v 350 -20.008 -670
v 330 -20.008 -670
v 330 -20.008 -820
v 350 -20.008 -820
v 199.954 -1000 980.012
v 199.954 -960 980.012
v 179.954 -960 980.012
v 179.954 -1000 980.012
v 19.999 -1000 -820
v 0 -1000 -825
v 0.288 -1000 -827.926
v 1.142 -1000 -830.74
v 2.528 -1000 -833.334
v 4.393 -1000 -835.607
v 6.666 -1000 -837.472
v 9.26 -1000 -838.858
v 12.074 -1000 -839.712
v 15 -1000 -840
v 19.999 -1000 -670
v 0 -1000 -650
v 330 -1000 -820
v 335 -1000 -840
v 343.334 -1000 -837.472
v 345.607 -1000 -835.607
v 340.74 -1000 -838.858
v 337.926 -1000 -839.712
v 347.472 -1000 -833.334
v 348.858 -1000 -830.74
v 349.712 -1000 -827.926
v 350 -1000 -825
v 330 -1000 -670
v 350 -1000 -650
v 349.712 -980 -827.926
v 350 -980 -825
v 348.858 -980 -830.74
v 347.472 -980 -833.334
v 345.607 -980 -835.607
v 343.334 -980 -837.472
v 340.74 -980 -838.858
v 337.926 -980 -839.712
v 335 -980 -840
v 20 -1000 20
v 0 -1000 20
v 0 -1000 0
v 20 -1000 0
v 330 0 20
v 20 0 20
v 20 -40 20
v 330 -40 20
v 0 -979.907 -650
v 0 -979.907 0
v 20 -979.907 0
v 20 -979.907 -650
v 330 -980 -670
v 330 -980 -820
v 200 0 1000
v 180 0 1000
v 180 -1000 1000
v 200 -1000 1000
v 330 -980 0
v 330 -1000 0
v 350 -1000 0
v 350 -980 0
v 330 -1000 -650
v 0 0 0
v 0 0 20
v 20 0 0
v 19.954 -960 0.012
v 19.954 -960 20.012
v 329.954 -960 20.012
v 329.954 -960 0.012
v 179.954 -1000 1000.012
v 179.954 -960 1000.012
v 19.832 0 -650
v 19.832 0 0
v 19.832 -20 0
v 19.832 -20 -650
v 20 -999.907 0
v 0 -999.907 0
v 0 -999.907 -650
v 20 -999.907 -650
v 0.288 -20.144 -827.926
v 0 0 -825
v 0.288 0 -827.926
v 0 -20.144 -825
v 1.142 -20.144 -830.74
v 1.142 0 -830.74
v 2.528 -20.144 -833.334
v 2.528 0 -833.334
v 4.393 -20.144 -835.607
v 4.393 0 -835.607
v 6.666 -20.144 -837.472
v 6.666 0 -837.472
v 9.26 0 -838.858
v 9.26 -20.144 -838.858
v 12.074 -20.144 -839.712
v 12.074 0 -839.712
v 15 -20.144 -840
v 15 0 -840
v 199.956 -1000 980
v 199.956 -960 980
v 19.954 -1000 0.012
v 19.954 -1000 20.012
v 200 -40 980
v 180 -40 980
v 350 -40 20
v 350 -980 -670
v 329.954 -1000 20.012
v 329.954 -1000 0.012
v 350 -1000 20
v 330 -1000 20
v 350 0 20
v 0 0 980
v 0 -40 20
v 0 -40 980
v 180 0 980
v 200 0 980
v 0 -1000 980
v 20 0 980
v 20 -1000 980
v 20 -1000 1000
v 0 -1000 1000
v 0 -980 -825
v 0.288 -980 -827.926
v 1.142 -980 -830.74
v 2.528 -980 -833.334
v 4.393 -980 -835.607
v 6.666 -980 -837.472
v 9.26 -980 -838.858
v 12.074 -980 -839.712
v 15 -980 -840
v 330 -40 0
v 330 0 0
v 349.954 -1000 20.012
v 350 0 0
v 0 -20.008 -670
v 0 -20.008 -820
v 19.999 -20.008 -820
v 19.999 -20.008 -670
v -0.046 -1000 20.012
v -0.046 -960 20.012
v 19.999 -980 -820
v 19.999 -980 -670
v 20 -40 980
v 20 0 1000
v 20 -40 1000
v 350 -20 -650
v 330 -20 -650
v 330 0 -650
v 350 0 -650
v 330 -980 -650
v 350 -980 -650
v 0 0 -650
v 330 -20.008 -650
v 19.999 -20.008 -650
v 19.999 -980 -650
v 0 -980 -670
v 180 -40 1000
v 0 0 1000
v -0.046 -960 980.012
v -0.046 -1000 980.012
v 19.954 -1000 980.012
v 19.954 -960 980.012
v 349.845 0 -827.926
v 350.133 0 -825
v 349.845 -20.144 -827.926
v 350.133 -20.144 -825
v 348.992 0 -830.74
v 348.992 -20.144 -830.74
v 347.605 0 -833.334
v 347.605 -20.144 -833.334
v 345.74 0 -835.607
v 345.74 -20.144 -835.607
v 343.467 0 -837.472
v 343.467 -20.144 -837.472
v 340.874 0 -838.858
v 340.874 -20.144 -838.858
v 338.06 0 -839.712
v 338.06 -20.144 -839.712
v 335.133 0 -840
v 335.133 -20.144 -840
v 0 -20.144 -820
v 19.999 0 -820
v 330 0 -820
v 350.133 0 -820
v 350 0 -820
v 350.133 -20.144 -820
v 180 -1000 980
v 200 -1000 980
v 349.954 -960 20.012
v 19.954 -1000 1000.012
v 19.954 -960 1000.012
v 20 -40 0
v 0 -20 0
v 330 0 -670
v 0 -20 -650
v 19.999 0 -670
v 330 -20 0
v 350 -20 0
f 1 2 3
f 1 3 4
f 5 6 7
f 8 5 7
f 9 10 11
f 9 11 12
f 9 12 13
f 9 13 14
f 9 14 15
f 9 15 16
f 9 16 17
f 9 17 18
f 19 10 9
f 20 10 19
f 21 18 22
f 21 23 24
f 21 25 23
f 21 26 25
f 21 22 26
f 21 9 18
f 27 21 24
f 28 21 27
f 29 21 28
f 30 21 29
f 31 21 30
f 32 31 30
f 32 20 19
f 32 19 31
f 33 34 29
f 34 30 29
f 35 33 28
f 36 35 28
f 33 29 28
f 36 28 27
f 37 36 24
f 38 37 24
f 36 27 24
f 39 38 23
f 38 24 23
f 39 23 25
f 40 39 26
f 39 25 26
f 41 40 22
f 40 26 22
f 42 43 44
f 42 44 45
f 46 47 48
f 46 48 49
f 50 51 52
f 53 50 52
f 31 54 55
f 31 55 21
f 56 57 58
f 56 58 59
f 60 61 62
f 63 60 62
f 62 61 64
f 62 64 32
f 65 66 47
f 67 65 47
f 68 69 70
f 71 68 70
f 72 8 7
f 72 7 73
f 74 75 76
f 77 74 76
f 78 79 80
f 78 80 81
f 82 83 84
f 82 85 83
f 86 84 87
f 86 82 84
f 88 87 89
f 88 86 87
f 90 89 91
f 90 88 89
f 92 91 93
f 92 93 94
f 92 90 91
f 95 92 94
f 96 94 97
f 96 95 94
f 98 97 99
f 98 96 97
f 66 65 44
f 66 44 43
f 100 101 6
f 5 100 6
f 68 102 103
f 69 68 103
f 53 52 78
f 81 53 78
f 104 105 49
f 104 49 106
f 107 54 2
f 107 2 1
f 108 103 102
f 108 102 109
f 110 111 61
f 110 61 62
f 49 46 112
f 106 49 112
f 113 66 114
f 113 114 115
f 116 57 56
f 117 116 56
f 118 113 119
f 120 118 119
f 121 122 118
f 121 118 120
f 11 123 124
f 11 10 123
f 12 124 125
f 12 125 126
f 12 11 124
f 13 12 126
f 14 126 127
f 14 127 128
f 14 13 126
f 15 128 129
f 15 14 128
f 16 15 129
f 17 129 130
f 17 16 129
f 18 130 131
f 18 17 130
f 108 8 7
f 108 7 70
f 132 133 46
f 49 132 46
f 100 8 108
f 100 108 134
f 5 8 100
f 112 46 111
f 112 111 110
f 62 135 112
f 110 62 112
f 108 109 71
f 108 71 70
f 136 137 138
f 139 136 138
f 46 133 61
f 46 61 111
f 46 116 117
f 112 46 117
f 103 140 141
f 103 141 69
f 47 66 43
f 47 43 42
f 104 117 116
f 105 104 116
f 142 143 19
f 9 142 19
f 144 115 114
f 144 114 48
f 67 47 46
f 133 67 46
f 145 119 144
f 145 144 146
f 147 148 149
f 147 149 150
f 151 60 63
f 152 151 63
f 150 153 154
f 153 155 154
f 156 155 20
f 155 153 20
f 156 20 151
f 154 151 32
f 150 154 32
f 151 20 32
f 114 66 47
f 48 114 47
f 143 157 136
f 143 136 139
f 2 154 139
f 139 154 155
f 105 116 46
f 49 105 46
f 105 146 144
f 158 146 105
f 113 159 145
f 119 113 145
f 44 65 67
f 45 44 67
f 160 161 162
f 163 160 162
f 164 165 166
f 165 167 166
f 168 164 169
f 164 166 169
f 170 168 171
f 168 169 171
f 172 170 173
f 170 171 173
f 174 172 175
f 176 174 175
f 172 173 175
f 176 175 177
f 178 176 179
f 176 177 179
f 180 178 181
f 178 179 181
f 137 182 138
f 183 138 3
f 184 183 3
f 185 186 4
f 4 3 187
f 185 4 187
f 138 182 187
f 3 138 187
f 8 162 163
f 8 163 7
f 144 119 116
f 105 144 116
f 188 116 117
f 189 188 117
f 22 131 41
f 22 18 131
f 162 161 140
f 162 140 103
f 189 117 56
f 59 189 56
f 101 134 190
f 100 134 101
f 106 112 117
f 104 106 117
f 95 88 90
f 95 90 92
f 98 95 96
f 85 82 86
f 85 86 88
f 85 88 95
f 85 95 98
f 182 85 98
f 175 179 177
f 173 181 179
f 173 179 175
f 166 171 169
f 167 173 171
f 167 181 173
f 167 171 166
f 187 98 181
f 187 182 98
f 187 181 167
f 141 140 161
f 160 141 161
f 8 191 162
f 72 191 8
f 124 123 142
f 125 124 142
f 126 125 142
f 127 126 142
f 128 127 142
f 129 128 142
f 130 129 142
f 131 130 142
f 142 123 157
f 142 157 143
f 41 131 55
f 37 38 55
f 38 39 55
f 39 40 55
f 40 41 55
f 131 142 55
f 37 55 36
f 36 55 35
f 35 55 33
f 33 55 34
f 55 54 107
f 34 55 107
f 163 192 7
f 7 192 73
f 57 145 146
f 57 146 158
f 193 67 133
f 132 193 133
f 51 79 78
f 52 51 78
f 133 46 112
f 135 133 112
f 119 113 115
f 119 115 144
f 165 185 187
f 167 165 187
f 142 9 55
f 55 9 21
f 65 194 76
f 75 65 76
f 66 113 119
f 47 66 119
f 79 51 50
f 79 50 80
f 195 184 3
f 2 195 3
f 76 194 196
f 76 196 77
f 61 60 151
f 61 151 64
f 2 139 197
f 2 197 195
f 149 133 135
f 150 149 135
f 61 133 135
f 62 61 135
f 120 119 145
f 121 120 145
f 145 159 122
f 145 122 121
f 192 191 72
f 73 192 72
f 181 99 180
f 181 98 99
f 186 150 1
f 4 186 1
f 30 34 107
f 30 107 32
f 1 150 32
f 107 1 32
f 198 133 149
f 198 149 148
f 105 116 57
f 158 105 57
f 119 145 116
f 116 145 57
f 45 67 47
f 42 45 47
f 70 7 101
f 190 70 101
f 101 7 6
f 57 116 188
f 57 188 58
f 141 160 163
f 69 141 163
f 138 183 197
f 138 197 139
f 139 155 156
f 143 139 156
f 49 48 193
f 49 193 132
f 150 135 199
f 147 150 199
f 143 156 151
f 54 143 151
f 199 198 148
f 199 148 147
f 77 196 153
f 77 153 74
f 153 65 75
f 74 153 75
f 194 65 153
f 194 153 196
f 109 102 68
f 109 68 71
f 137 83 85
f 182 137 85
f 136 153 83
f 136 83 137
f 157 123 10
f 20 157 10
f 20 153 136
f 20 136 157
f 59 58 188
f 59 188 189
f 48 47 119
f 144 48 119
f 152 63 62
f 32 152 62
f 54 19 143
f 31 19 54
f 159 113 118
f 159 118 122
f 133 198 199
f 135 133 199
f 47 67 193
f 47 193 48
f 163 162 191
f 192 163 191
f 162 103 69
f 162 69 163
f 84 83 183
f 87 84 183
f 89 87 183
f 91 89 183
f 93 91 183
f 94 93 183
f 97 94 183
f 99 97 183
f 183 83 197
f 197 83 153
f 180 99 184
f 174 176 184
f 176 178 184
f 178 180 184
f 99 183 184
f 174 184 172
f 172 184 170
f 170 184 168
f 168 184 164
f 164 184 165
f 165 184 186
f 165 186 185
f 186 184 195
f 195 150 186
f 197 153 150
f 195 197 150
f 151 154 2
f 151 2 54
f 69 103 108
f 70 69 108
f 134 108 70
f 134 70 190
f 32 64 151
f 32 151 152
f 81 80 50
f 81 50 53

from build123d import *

# Parameters (mm, degrees)
F0_W      = 20
F0_H      = 20
F1_DEPTH  = 1000
F0_W_2    = 160
F3_DEPTH  = 40
F0_H_2    = 960
F0_W_3    = 310
F2_W      = 20
F2_H      = 960
F4_DEPTH  = 40
F2_W_2    = 160
F2_H_2    = 20
F2_W_3    = 310
F5_W      = 20
F5_H      = 20
F6_DEPTH  = 650
F5_W_2    = 19.8324881494
F7_W      = 20
F7_H      = 20
F7_H_2    = 959.9921046942
F7_W_2    = 19.9989583343
F8_DEPTH  = 20
F9_W      = 19.9989583343
F9_H      = 20
F9_W_2    = 20
F9_H_2    = 20.0078953058
F10_DEPTH = 150
F11_W     = 350.1334488392
F11_H     = 20.1436914504
F11_W_2   = 330
F11_H_2   = 20
F11_W_3   = 20
F12_DEPTH = 20
F13_R     = 15


with BuildPart() as f1:
    # F0 (on Front) → F1 (new body)
    with BuildSketch(Plane.XZ):
        with Locations((190, 990)):
            Rectangle(F0_W, F0_H)
    extrude(amount=F1_DEPTH)


with BuildPart() as f1b:
    # F0 (on Front) → F1, piece 2 (new body)
    with BuildSketch(Plane.XZ):
        with Locations((10, 990)):
            Rectangle(F0_W, F0_H)
    extrude(amount=F1_DEPTH)


with BuildPart() as f1c:
    # F0 (on Front) → F1, piece 3 (new body)
    with BuildSketch(Plane.XZ):
        with Locations((10, 10)):
            Rectangle(F0_W, F0_H)
    extrude(amount=F1_DEPTH)


with BuildPart() as f1d:
    # F0 (on Front) → F1, piece 4 (new body)
    with BuildSketch(Plane.XZ):
        with Locations((340, 10)):
            Rectangle(F0_W, F0_H)
    extrude(amount=F1_DEPTH)


with BuildPart() as f3:
    # F0 (on Front) → F3 (new body)
    with BuildSketch(Plane.XZ):
        with Locations((100, 990)):
            Rectangle(F0_W_2, F0_H)
    extrude(amount=F3_DEPTH)


with BuildPart() as f3b:
    # F0 (on Front) → F3, piece 2 (new body)
    with BuildSketch(Plane.XZ):
        Polygon((180, 980), (330, 20), (350, 20), (200, 980), align=None)
    extrude(amount=F3_DEPTH)


with BuildPart() as f3c:
    # F0 (on Front) → F3, piece 3 (new body)
    with BuildSketch(Plane.XZ):
        with Locations((10, 500)):
            Rectangle(F0_W, F0_H_2)
    extrude(amount=F3_DEPTH)


with BuildPart() as f3d:
    # F0 (on Front) → F3, piece 4 (new body)
    with BuildSketch(Plane.XZ):
        with Locations((175, 10)):
            Rectangle(F0_W_3, F0_H)
    extrude(amount=F3_DEPTH)


with BuildPart() as f4:
    # F2 (on face) → F4 (new body)
    with BuildSketch(Plane.XZ.offset(1000)):
        with Locations((9.9536648015, 500.0118422508)):
            Rectangle(F2_W, F2_H)
    extrude(amount=-F4_DEPTH)


with BuildPart() as f4b:
    # F2 (on face) → F4, piece 2 (new body)
    with BuildSketch(Plane.XZ.offset(1000)):
        with Locations((99.9536648015, 990.0118422508)):
            Rectangle(F2_W_2, F2_H_2)
    extrude(amount=-F4_DEPTH)


with BuildPart() as f4c:
    # F2 (on face) → F4, piece 3 (new body)
    with BuildSketch(Plane.XZ.offset(1000)):
        Polygon((180, 980), (199.9555151532, 980), (199.9536648015, 980.0118422508), (180, 980.0118422508), align=None)
        Polygon((179.9536648015, 980.0118422508), (329.9536648015, 20.0118422508), (349.9536648015, 20.0118422508), (199.9555151532, 980), (180, 980), (180, 980.0118422508), align=None)
    extrude(amount=-F4_DEPTH)


with BuildPart() as f4d:
    # F2 (on face) → F4, piece 4 (new body)
    with BuildSketch(Plane.XZ.offset(1000)):
        with Locations((174.9536648015, 10.0118422508)):
            Rectangle(F2_W_3, F2_H_2)
    extrude(amount=-F4_DEPTH)


with BuildPart() as f6:
    # F5 (on face) → F6 (new body)
    with BuildSketch(Plane(origin=(0, 0, 0), x_dir=(1, 0, 0), z_dir=(0, 0, -1))):
        with Locations((10, 989.9068570137)):
            Rectangle(F5_W, F5_H)
    extrude(amount=F6_DEPTH)


with BuildPart() as f6b:
    # F5 (on face) → F6, piece 2 (new body)
    with BuildSketch(Plane(origin=(0, 0, 0), x_dir=(1, 0, 0), z_dir=(0, 0, -1))):
        with Locations((340, 990)):
            Rectangle(F5_W, F5_H)
    extrude(amount=F6_DEPTH)


with BuildPart() as f6c:
    # F5 (on face) → F6, piece 3 (new body)
    with BuildSketch(Plane(origin=(0, 0, 0), x_dir=(1, 0, 0), z_dir=(0, 0, -1))):
        with Locations((340, 10)):
            Rectangle(F5_W, F5_H)
    extrude(amount=F6_DEPTH)


with BuildPart() as f6d:
    # F5 (on face) → F6, piece 4 (new body)
    with BuildSketch(Plane(origin=(0, 0, 0), x_dir=(1, 0, 0), z_dir=(0, 0, -1))):
        with Locations((9.9162440747, 10)):
            Rectangle(F5_W_2, F5_H)
    extrude(amount=F6_DEPTH)


with BuildPart() as f8:
    # F7 (on face) → F8 (new body)
    with BuildSketch(Plane(origin=(0, 0, -650), x_dir=(1, 0, 0), z_dir=(0, 0, -1))):
        Polygon((330, 980), (330, 1000), (0, 1000), (0, 980), (19.9989583343, 980), align=None)
        with Locations((340, 990)):
            Rectangle(F7_W, F7_H)
        with Locations((340, 500.0039476529)):
            Rectangle(F7_W, F7_H_2)
        with Locations((9.9994791672, 500.0039476529)):
            Rectangle(F7_W_2, F7_H_2)
        Polygon((350, 0), (350, 20.0078953058), (330, 20.0078953058), (19.9989583343, 20.0078953058), (0, 20.0078953058), (0, 0), align=None)
    extrude(amount=F8_DEPTH)

    # F9 (on face) → F10 (join)
    with BuildSketch(Plane(origin=(0, 0, -670), x_dir=(1, 0, 0), z_dir=(0, 0, -1))):
        with Locations((9.9994791672, 990)):
            Rectangle(F9_W, F9_H)
        with Locations((340, 990)):
            Rectangle(F9_W_2, F9_H)
        with Locations((340, 10.0039476529)):
            Rectangle(F9_W_2, F9_H_2)
        with Locations((9.9994791672, 10.0039476529)):
            Rectangle(F9_W, F9_H_2)
    extrude(amount=F10_DEPTH)

    # F11 (on face) → F12 (join)
    with BuildSketch(Plane(origin=(0, 0, -820), x_dir=(1, 0, 0), z_dir=(0, 0, -1))):
        with Locations((175.0667244196, 10.0718457252)):
            Rectangle(F11_W, F11_H)
        with Locations((165, 990)):
            Rectangle(F11_W_2, F11_H_2)
        with Locations((340, 990)):
            Rectangle(F11_W_3, F11_H_2)
    extrude(amount=F12_DEPTH)

    # F13
    f13_edges = [f8.edges().sort_by_distance(p)[0] for p in [
        (350, -990, -840),
        (0, -990, -840),
        (0, -10.071846, -840),
        (350.133449, -10.071846, -840),
    ]]
    fillet(f13_edges, radius=F13_R)


solid = Compound([f1.part, f1b.part, f1c.part, f1d.part, f3.part, f3b.part, f3c.part, f3d.part, f4.part, f4b.part, f4c.part, f4d.part, f6.part, f6b.part, f6c.part, f6d.part, f8.part])
